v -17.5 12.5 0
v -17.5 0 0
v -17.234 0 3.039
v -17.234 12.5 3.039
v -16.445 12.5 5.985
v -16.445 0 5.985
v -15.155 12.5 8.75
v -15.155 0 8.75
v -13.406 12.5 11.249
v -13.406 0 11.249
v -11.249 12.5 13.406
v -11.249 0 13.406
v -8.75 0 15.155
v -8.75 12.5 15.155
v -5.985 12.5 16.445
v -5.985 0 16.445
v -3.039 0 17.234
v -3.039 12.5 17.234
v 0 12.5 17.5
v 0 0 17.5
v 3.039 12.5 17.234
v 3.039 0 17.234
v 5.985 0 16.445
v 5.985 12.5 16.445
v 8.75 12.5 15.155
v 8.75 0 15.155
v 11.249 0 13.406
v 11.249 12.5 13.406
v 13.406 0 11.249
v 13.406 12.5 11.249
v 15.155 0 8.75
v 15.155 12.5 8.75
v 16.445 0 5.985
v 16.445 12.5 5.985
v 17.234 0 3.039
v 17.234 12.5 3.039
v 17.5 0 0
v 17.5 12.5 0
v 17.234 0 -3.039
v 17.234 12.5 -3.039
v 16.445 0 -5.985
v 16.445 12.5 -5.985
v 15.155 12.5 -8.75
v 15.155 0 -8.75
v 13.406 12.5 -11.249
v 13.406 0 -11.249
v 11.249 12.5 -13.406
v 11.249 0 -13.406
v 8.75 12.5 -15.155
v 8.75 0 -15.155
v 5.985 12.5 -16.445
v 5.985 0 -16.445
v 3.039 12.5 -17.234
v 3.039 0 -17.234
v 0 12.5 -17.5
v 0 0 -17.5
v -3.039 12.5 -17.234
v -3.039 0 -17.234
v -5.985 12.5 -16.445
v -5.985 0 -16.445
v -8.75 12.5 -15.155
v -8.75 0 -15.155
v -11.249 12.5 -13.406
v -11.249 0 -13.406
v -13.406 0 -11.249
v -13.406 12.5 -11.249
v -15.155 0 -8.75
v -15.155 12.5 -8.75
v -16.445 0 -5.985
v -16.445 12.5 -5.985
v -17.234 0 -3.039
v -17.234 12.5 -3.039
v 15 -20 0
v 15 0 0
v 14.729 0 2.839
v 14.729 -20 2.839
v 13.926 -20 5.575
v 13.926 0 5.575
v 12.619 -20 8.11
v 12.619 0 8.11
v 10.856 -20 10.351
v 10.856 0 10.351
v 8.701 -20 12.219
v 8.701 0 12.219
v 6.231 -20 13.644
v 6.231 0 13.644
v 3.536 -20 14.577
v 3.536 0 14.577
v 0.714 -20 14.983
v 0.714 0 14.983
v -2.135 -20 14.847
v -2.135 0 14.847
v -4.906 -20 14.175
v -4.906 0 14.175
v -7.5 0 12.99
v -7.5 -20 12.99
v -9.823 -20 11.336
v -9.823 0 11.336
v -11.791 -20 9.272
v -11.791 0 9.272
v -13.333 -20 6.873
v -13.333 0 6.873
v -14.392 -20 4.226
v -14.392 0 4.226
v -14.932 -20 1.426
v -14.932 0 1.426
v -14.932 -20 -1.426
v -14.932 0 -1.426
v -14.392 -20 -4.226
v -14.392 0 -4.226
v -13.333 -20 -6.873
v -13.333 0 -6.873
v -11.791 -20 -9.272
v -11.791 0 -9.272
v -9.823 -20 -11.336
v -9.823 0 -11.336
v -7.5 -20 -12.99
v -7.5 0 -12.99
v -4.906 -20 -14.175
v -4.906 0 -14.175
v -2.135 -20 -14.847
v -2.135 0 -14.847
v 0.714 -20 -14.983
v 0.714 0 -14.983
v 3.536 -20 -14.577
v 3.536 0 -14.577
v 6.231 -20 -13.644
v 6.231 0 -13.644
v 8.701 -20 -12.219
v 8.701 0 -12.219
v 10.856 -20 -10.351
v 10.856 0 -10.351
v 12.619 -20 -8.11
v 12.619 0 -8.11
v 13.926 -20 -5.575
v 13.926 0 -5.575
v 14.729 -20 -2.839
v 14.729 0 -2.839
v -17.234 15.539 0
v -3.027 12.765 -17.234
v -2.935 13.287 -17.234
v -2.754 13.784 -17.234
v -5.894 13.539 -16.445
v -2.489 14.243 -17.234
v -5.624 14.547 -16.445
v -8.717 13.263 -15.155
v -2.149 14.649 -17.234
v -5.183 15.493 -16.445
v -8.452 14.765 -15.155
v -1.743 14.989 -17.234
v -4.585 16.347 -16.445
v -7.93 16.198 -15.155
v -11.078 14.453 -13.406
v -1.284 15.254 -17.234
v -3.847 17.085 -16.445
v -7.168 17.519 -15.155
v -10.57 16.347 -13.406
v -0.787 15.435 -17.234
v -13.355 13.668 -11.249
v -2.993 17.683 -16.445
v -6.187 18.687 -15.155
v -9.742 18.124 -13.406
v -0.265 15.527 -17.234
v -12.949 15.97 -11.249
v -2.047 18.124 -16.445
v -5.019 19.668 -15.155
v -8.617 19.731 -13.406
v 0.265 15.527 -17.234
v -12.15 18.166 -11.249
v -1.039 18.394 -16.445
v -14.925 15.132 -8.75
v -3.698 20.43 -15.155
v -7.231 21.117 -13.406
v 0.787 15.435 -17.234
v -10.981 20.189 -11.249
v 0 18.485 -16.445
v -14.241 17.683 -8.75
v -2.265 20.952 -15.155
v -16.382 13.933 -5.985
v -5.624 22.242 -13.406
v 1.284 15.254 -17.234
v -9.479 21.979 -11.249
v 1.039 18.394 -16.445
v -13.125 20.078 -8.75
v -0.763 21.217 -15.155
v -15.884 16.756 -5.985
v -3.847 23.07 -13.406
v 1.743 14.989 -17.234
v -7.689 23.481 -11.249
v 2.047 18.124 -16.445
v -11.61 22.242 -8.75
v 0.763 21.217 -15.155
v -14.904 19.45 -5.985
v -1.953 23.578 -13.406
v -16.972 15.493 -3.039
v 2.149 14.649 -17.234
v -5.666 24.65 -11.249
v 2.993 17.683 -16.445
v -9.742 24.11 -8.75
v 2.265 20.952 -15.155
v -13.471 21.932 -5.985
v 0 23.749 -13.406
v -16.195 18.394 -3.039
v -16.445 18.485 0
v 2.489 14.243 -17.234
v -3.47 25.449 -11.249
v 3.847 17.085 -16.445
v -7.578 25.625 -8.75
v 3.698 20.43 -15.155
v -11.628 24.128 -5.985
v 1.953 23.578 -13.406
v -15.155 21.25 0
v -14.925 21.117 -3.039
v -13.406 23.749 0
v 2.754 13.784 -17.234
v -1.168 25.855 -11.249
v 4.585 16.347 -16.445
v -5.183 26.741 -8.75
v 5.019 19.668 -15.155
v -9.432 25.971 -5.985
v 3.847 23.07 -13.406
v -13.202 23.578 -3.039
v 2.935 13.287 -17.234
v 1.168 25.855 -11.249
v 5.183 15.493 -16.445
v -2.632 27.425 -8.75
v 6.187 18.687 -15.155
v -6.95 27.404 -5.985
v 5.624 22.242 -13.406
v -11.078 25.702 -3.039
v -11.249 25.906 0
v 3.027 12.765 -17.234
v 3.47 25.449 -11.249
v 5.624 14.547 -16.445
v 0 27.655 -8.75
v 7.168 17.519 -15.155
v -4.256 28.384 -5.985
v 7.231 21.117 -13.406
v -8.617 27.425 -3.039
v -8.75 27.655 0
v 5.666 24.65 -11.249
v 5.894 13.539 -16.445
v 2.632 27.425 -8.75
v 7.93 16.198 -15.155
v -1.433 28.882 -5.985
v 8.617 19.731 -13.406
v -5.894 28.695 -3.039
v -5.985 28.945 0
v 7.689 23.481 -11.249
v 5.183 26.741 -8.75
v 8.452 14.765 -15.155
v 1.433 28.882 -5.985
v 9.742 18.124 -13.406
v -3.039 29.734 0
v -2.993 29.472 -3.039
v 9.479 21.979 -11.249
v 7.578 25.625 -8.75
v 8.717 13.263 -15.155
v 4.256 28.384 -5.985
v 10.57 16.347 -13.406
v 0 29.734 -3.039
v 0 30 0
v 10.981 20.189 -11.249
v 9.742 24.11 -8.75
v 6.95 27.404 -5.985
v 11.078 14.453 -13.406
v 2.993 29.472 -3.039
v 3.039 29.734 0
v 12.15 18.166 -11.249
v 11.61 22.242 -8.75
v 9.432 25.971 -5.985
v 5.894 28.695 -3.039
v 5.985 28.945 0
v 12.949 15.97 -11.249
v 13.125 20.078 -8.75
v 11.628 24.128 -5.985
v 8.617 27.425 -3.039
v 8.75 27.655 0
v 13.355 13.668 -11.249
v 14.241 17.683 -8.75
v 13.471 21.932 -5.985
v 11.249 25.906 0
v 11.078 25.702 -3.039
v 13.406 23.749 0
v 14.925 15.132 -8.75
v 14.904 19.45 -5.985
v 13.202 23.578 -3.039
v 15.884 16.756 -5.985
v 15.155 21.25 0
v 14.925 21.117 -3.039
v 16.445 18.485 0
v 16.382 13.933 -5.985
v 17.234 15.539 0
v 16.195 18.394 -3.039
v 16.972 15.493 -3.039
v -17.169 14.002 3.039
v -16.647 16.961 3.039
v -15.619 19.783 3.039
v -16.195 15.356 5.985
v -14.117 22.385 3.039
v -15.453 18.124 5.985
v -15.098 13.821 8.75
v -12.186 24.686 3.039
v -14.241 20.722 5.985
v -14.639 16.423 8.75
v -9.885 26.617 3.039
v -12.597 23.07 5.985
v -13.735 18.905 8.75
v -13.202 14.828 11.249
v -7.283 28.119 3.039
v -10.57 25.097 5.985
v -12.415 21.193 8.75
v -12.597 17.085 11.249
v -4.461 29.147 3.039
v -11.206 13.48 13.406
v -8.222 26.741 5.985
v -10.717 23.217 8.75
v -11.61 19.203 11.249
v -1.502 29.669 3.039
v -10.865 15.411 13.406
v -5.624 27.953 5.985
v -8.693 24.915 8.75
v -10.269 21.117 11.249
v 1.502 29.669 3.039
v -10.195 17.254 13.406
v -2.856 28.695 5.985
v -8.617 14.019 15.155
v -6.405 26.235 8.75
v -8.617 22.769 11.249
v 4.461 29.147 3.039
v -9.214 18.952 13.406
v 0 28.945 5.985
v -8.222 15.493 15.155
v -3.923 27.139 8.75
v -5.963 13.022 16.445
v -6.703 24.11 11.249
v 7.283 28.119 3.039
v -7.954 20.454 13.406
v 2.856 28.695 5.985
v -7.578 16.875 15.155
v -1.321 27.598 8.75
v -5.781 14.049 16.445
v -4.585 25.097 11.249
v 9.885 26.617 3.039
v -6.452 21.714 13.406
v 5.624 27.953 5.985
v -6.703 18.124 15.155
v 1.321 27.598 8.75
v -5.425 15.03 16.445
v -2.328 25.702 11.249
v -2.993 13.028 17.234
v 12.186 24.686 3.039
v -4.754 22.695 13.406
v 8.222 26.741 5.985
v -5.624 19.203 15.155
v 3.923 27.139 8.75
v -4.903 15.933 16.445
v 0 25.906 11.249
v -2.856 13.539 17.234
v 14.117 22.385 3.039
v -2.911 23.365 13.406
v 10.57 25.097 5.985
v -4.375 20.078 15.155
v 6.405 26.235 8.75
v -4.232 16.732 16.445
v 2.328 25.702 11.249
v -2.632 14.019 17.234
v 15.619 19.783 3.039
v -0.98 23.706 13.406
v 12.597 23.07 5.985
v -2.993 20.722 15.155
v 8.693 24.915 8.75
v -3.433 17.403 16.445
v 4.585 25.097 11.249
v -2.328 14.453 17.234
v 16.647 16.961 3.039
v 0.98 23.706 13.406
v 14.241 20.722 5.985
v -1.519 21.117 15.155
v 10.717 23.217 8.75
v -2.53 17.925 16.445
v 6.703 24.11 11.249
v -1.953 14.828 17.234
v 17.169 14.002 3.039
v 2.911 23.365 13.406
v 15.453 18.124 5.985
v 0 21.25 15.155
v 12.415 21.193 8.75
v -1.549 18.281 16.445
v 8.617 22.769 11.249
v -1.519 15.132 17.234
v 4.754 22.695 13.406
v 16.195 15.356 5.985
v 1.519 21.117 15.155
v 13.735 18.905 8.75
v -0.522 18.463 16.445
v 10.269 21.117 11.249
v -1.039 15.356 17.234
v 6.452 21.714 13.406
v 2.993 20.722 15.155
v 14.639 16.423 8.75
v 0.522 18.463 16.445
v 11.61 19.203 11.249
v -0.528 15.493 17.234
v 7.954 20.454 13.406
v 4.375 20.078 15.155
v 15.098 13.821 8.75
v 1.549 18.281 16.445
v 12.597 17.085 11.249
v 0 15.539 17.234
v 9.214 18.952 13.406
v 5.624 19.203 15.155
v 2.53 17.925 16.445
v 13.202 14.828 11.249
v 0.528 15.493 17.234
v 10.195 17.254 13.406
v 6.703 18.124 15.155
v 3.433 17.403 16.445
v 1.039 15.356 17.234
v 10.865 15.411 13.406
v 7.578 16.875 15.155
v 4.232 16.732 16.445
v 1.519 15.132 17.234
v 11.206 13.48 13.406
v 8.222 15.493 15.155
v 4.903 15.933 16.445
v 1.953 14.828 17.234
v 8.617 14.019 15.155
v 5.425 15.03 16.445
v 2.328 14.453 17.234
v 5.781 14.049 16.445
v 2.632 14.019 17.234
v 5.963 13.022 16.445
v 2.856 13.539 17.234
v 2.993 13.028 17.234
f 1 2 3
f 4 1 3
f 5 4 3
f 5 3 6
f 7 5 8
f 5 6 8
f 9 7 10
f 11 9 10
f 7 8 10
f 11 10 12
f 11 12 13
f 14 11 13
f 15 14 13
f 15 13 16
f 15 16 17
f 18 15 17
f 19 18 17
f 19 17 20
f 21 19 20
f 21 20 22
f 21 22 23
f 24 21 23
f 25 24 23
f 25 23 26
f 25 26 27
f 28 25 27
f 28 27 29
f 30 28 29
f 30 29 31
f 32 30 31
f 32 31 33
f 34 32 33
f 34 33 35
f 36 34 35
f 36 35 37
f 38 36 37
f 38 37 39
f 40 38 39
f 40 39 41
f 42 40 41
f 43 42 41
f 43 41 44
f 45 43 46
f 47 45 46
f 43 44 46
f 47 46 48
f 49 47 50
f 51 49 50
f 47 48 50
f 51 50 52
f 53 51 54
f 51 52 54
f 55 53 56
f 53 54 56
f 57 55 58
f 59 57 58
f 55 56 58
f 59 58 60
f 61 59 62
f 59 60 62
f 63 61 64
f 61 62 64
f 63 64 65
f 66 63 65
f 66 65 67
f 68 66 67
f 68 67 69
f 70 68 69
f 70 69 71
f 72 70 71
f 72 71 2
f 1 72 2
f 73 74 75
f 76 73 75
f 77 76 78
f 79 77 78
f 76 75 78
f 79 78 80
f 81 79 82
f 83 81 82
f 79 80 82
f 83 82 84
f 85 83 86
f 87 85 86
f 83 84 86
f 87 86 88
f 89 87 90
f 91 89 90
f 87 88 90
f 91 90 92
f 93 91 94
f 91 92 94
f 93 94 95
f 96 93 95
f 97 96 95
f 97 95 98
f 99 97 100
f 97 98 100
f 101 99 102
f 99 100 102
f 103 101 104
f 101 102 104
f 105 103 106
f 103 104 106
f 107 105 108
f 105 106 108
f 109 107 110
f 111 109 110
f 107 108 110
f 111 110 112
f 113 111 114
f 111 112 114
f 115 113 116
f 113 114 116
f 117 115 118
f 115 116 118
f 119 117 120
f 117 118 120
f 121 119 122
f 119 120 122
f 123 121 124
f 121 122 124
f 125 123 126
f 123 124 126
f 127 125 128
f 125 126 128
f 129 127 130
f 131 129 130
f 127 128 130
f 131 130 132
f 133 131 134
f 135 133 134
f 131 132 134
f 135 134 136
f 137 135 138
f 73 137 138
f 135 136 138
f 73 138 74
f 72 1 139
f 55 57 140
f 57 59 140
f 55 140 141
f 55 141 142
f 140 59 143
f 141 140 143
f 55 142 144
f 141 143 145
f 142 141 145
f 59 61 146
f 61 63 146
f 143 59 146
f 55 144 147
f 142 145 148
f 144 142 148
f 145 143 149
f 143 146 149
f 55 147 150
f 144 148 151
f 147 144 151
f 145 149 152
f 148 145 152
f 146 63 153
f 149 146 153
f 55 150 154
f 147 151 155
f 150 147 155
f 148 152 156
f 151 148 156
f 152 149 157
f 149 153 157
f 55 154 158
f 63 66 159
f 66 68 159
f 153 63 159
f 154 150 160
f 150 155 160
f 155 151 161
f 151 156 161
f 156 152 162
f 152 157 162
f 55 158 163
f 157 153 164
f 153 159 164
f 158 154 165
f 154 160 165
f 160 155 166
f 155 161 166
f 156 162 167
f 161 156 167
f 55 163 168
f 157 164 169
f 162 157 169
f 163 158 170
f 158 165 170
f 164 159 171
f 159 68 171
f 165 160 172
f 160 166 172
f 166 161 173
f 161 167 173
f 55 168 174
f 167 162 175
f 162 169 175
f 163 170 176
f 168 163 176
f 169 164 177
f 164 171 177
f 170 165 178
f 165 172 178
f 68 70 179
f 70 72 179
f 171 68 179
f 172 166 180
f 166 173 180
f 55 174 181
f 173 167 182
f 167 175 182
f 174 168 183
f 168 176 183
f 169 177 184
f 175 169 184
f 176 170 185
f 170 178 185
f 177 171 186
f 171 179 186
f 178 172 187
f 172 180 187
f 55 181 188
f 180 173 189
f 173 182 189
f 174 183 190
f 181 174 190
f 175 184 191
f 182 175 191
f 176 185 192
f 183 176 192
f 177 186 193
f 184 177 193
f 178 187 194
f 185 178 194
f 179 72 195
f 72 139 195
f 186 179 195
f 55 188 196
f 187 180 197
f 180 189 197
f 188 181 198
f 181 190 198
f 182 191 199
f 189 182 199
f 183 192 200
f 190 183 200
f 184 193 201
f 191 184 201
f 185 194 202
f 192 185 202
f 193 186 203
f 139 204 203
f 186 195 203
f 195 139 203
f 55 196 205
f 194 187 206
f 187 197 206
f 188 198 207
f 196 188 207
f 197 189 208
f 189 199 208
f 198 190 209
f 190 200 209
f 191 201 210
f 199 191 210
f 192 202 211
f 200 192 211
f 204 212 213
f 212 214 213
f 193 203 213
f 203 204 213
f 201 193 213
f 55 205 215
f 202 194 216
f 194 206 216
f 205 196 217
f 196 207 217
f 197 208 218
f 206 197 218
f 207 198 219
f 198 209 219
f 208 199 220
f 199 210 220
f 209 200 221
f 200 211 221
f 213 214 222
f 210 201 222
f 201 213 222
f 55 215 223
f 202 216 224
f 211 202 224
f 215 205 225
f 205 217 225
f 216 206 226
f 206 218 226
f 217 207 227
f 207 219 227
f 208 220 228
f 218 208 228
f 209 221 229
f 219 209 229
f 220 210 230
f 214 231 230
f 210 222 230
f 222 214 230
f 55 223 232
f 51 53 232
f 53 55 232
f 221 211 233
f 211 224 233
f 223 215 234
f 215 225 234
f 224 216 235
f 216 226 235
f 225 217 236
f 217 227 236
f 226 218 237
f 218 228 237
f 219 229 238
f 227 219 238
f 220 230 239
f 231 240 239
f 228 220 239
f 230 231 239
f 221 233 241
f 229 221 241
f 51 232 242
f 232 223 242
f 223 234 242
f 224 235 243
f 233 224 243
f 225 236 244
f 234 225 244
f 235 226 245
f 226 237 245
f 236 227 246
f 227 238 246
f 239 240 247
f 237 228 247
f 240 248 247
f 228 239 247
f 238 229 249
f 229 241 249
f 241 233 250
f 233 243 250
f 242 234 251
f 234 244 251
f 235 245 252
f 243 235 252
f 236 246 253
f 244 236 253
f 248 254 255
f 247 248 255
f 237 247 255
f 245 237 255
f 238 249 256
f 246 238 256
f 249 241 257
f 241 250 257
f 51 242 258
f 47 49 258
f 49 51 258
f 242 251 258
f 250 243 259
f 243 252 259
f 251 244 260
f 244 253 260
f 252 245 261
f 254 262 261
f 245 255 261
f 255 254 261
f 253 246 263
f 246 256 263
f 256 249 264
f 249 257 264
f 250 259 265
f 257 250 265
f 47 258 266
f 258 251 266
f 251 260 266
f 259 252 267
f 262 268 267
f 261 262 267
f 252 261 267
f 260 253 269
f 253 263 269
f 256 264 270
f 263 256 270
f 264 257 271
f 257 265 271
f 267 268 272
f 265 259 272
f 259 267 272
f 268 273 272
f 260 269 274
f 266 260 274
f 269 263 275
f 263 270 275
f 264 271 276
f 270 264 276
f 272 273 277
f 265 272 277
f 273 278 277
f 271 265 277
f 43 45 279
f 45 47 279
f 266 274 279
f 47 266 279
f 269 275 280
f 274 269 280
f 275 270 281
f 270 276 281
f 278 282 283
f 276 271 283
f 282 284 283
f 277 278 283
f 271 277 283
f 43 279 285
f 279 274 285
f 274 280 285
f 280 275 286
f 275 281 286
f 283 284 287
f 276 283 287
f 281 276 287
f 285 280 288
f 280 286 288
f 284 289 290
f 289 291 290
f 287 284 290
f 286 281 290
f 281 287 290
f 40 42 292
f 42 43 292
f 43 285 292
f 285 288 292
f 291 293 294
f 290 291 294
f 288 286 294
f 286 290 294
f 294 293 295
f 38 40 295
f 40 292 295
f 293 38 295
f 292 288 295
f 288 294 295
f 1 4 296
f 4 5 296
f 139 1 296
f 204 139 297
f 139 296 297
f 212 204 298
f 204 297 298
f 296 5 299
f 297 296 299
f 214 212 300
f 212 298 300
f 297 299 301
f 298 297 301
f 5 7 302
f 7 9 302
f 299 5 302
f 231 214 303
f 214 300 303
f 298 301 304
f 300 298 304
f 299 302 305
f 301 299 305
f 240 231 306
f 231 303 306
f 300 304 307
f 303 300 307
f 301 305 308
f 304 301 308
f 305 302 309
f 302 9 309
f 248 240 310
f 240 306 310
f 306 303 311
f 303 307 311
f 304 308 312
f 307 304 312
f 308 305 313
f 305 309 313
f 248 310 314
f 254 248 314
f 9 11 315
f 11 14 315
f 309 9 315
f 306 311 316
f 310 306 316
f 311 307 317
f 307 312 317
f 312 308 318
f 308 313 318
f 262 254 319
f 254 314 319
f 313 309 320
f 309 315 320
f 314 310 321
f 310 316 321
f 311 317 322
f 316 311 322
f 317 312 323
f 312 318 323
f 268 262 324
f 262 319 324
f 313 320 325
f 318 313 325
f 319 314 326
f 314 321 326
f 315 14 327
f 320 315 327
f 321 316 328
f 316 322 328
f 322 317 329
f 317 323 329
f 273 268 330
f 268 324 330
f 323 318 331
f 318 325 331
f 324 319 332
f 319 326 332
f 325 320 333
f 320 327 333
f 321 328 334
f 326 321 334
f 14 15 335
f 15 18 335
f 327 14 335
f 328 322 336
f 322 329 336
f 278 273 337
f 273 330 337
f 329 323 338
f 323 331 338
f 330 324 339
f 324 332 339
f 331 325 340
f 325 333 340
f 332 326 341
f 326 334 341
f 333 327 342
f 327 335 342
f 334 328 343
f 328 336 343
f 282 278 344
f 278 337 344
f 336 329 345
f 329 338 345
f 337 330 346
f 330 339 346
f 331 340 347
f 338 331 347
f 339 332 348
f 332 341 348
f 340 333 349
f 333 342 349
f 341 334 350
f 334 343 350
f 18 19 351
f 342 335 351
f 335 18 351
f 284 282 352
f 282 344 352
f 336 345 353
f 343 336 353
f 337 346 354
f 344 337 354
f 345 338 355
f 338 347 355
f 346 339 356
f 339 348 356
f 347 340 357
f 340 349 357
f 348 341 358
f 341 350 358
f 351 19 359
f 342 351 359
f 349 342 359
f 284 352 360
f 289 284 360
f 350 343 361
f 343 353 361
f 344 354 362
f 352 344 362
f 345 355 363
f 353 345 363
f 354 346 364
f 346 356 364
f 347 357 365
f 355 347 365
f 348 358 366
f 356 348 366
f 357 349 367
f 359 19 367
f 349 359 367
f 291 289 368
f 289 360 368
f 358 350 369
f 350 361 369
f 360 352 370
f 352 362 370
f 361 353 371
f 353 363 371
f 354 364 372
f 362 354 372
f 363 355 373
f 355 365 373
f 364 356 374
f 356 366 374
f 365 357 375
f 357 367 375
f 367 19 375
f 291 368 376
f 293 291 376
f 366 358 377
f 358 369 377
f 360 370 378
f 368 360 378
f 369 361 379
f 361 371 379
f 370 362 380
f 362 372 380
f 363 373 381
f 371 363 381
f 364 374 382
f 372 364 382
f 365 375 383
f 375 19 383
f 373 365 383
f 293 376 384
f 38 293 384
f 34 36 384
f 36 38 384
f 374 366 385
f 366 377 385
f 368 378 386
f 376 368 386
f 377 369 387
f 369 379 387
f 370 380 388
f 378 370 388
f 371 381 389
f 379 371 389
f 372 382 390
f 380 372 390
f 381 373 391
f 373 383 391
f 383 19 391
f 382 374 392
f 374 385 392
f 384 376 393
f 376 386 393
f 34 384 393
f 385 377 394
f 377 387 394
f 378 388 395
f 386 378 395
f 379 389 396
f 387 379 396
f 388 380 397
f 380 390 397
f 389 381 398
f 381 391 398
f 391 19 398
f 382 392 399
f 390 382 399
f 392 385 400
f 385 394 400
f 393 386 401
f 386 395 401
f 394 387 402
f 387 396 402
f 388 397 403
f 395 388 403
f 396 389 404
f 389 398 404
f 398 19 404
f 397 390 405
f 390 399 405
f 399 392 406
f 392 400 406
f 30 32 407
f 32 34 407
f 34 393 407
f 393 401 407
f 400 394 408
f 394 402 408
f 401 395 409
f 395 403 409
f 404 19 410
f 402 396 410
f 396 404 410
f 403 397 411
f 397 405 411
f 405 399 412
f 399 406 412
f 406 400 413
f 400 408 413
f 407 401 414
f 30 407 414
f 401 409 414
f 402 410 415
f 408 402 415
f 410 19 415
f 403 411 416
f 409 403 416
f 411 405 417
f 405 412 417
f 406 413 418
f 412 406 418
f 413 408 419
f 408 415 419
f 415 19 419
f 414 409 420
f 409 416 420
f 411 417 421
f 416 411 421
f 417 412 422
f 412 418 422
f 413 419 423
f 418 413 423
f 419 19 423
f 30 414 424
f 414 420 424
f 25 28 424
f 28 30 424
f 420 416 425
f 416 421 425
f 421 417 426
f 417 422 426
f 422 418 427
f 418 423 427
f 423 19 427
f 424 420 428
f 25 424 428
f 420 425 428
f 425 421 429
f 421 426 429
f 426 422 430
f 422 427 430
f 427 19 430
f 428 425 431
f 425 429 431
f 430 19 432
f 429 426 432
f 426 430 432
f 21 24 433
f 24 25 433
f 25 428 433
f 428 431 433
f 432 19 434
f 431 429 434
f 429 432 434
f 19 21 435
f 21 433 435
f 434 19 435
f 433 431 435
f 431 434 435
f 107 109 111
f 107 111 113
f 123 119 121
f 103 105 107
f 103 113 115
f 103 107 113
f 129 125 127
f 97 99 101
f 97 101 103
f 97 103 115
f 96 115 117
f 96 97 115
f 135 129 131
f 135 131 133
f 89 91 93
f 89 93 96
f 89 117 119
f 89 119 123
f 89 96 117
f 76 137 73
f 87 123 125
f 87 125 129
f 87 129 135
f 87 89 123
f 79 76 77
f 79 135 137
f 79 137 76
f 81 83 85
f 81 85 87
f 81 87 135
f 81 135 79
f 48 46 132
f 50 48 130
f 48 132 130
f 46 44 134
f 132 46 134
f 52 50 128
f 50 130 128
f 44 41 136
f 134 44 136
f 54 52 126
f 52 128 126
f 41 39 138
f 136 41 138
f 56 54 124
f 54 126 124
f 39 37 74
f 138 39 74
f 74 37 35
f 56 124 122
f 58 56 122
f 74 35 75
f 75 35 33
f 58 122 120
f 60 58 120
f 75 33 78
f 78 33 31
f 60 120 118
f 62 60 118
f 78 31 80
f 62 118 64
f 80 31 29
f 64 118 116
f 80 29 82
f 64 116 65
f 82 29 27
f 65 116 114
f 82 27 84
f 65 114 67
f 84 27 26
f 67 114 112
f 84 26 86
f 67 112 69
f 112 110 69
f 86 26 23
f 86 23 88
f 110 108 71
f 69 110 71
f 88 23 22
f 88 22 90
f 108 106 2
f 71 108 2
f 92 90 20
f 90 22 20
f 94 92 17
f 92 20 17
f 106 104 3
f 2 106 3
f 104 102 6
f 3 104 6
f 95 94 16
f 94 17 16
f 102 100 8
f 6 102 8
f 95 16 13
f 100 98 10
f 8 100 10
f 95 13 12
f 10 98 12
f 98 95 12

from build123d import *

# Parameters (mm, degrees)
F0_R     = 15
F1_DEPTH = 20
F2_R     = 17.5
F2_R_2   = 15
F3_DEPTH = 12.5


with BuildPart() as f1:
    # F0 (on Front) → F1 (new body)
    with BuildSketch(Plane.XZ):
        Circle(F0_R)
    extrude(amount=F1_DEPTH)

    # F2 (on face) → F3 (join)
    with BuildSketch(Plane(origin=(0, 0, 0), x_dir=(-1, 0, 0), z_dir=(0, 1, 0))):
        Circle(F2_R)
        Circle(F2_R_2, mode=Mode.SUBTRACT)
        Circle(F2_R_2)
    extrude(amount=F3_DEPTH)

    # F4 (on face) → F5 (revolve)
    with BuildSketch(Plane(origin=(0, 12.5, 0), x_dir=(-1, 0, 0), z_dir=(0, 1, 0))):
        with BuildLine():
            ThreePointArc((17.5, 0), (12.3743686708, 12.3743686708), (0, 17.5))
            Line((0, 17.5), (0, -17.5))
            ThreePointArc((0, -17.5), (12.3743686708, -12.3743686708), (17.5, 0))
        make_face()
    revolve(axis=Axis((0, 12.5, 0), (0, 0, -1)))


solid = f1.part
